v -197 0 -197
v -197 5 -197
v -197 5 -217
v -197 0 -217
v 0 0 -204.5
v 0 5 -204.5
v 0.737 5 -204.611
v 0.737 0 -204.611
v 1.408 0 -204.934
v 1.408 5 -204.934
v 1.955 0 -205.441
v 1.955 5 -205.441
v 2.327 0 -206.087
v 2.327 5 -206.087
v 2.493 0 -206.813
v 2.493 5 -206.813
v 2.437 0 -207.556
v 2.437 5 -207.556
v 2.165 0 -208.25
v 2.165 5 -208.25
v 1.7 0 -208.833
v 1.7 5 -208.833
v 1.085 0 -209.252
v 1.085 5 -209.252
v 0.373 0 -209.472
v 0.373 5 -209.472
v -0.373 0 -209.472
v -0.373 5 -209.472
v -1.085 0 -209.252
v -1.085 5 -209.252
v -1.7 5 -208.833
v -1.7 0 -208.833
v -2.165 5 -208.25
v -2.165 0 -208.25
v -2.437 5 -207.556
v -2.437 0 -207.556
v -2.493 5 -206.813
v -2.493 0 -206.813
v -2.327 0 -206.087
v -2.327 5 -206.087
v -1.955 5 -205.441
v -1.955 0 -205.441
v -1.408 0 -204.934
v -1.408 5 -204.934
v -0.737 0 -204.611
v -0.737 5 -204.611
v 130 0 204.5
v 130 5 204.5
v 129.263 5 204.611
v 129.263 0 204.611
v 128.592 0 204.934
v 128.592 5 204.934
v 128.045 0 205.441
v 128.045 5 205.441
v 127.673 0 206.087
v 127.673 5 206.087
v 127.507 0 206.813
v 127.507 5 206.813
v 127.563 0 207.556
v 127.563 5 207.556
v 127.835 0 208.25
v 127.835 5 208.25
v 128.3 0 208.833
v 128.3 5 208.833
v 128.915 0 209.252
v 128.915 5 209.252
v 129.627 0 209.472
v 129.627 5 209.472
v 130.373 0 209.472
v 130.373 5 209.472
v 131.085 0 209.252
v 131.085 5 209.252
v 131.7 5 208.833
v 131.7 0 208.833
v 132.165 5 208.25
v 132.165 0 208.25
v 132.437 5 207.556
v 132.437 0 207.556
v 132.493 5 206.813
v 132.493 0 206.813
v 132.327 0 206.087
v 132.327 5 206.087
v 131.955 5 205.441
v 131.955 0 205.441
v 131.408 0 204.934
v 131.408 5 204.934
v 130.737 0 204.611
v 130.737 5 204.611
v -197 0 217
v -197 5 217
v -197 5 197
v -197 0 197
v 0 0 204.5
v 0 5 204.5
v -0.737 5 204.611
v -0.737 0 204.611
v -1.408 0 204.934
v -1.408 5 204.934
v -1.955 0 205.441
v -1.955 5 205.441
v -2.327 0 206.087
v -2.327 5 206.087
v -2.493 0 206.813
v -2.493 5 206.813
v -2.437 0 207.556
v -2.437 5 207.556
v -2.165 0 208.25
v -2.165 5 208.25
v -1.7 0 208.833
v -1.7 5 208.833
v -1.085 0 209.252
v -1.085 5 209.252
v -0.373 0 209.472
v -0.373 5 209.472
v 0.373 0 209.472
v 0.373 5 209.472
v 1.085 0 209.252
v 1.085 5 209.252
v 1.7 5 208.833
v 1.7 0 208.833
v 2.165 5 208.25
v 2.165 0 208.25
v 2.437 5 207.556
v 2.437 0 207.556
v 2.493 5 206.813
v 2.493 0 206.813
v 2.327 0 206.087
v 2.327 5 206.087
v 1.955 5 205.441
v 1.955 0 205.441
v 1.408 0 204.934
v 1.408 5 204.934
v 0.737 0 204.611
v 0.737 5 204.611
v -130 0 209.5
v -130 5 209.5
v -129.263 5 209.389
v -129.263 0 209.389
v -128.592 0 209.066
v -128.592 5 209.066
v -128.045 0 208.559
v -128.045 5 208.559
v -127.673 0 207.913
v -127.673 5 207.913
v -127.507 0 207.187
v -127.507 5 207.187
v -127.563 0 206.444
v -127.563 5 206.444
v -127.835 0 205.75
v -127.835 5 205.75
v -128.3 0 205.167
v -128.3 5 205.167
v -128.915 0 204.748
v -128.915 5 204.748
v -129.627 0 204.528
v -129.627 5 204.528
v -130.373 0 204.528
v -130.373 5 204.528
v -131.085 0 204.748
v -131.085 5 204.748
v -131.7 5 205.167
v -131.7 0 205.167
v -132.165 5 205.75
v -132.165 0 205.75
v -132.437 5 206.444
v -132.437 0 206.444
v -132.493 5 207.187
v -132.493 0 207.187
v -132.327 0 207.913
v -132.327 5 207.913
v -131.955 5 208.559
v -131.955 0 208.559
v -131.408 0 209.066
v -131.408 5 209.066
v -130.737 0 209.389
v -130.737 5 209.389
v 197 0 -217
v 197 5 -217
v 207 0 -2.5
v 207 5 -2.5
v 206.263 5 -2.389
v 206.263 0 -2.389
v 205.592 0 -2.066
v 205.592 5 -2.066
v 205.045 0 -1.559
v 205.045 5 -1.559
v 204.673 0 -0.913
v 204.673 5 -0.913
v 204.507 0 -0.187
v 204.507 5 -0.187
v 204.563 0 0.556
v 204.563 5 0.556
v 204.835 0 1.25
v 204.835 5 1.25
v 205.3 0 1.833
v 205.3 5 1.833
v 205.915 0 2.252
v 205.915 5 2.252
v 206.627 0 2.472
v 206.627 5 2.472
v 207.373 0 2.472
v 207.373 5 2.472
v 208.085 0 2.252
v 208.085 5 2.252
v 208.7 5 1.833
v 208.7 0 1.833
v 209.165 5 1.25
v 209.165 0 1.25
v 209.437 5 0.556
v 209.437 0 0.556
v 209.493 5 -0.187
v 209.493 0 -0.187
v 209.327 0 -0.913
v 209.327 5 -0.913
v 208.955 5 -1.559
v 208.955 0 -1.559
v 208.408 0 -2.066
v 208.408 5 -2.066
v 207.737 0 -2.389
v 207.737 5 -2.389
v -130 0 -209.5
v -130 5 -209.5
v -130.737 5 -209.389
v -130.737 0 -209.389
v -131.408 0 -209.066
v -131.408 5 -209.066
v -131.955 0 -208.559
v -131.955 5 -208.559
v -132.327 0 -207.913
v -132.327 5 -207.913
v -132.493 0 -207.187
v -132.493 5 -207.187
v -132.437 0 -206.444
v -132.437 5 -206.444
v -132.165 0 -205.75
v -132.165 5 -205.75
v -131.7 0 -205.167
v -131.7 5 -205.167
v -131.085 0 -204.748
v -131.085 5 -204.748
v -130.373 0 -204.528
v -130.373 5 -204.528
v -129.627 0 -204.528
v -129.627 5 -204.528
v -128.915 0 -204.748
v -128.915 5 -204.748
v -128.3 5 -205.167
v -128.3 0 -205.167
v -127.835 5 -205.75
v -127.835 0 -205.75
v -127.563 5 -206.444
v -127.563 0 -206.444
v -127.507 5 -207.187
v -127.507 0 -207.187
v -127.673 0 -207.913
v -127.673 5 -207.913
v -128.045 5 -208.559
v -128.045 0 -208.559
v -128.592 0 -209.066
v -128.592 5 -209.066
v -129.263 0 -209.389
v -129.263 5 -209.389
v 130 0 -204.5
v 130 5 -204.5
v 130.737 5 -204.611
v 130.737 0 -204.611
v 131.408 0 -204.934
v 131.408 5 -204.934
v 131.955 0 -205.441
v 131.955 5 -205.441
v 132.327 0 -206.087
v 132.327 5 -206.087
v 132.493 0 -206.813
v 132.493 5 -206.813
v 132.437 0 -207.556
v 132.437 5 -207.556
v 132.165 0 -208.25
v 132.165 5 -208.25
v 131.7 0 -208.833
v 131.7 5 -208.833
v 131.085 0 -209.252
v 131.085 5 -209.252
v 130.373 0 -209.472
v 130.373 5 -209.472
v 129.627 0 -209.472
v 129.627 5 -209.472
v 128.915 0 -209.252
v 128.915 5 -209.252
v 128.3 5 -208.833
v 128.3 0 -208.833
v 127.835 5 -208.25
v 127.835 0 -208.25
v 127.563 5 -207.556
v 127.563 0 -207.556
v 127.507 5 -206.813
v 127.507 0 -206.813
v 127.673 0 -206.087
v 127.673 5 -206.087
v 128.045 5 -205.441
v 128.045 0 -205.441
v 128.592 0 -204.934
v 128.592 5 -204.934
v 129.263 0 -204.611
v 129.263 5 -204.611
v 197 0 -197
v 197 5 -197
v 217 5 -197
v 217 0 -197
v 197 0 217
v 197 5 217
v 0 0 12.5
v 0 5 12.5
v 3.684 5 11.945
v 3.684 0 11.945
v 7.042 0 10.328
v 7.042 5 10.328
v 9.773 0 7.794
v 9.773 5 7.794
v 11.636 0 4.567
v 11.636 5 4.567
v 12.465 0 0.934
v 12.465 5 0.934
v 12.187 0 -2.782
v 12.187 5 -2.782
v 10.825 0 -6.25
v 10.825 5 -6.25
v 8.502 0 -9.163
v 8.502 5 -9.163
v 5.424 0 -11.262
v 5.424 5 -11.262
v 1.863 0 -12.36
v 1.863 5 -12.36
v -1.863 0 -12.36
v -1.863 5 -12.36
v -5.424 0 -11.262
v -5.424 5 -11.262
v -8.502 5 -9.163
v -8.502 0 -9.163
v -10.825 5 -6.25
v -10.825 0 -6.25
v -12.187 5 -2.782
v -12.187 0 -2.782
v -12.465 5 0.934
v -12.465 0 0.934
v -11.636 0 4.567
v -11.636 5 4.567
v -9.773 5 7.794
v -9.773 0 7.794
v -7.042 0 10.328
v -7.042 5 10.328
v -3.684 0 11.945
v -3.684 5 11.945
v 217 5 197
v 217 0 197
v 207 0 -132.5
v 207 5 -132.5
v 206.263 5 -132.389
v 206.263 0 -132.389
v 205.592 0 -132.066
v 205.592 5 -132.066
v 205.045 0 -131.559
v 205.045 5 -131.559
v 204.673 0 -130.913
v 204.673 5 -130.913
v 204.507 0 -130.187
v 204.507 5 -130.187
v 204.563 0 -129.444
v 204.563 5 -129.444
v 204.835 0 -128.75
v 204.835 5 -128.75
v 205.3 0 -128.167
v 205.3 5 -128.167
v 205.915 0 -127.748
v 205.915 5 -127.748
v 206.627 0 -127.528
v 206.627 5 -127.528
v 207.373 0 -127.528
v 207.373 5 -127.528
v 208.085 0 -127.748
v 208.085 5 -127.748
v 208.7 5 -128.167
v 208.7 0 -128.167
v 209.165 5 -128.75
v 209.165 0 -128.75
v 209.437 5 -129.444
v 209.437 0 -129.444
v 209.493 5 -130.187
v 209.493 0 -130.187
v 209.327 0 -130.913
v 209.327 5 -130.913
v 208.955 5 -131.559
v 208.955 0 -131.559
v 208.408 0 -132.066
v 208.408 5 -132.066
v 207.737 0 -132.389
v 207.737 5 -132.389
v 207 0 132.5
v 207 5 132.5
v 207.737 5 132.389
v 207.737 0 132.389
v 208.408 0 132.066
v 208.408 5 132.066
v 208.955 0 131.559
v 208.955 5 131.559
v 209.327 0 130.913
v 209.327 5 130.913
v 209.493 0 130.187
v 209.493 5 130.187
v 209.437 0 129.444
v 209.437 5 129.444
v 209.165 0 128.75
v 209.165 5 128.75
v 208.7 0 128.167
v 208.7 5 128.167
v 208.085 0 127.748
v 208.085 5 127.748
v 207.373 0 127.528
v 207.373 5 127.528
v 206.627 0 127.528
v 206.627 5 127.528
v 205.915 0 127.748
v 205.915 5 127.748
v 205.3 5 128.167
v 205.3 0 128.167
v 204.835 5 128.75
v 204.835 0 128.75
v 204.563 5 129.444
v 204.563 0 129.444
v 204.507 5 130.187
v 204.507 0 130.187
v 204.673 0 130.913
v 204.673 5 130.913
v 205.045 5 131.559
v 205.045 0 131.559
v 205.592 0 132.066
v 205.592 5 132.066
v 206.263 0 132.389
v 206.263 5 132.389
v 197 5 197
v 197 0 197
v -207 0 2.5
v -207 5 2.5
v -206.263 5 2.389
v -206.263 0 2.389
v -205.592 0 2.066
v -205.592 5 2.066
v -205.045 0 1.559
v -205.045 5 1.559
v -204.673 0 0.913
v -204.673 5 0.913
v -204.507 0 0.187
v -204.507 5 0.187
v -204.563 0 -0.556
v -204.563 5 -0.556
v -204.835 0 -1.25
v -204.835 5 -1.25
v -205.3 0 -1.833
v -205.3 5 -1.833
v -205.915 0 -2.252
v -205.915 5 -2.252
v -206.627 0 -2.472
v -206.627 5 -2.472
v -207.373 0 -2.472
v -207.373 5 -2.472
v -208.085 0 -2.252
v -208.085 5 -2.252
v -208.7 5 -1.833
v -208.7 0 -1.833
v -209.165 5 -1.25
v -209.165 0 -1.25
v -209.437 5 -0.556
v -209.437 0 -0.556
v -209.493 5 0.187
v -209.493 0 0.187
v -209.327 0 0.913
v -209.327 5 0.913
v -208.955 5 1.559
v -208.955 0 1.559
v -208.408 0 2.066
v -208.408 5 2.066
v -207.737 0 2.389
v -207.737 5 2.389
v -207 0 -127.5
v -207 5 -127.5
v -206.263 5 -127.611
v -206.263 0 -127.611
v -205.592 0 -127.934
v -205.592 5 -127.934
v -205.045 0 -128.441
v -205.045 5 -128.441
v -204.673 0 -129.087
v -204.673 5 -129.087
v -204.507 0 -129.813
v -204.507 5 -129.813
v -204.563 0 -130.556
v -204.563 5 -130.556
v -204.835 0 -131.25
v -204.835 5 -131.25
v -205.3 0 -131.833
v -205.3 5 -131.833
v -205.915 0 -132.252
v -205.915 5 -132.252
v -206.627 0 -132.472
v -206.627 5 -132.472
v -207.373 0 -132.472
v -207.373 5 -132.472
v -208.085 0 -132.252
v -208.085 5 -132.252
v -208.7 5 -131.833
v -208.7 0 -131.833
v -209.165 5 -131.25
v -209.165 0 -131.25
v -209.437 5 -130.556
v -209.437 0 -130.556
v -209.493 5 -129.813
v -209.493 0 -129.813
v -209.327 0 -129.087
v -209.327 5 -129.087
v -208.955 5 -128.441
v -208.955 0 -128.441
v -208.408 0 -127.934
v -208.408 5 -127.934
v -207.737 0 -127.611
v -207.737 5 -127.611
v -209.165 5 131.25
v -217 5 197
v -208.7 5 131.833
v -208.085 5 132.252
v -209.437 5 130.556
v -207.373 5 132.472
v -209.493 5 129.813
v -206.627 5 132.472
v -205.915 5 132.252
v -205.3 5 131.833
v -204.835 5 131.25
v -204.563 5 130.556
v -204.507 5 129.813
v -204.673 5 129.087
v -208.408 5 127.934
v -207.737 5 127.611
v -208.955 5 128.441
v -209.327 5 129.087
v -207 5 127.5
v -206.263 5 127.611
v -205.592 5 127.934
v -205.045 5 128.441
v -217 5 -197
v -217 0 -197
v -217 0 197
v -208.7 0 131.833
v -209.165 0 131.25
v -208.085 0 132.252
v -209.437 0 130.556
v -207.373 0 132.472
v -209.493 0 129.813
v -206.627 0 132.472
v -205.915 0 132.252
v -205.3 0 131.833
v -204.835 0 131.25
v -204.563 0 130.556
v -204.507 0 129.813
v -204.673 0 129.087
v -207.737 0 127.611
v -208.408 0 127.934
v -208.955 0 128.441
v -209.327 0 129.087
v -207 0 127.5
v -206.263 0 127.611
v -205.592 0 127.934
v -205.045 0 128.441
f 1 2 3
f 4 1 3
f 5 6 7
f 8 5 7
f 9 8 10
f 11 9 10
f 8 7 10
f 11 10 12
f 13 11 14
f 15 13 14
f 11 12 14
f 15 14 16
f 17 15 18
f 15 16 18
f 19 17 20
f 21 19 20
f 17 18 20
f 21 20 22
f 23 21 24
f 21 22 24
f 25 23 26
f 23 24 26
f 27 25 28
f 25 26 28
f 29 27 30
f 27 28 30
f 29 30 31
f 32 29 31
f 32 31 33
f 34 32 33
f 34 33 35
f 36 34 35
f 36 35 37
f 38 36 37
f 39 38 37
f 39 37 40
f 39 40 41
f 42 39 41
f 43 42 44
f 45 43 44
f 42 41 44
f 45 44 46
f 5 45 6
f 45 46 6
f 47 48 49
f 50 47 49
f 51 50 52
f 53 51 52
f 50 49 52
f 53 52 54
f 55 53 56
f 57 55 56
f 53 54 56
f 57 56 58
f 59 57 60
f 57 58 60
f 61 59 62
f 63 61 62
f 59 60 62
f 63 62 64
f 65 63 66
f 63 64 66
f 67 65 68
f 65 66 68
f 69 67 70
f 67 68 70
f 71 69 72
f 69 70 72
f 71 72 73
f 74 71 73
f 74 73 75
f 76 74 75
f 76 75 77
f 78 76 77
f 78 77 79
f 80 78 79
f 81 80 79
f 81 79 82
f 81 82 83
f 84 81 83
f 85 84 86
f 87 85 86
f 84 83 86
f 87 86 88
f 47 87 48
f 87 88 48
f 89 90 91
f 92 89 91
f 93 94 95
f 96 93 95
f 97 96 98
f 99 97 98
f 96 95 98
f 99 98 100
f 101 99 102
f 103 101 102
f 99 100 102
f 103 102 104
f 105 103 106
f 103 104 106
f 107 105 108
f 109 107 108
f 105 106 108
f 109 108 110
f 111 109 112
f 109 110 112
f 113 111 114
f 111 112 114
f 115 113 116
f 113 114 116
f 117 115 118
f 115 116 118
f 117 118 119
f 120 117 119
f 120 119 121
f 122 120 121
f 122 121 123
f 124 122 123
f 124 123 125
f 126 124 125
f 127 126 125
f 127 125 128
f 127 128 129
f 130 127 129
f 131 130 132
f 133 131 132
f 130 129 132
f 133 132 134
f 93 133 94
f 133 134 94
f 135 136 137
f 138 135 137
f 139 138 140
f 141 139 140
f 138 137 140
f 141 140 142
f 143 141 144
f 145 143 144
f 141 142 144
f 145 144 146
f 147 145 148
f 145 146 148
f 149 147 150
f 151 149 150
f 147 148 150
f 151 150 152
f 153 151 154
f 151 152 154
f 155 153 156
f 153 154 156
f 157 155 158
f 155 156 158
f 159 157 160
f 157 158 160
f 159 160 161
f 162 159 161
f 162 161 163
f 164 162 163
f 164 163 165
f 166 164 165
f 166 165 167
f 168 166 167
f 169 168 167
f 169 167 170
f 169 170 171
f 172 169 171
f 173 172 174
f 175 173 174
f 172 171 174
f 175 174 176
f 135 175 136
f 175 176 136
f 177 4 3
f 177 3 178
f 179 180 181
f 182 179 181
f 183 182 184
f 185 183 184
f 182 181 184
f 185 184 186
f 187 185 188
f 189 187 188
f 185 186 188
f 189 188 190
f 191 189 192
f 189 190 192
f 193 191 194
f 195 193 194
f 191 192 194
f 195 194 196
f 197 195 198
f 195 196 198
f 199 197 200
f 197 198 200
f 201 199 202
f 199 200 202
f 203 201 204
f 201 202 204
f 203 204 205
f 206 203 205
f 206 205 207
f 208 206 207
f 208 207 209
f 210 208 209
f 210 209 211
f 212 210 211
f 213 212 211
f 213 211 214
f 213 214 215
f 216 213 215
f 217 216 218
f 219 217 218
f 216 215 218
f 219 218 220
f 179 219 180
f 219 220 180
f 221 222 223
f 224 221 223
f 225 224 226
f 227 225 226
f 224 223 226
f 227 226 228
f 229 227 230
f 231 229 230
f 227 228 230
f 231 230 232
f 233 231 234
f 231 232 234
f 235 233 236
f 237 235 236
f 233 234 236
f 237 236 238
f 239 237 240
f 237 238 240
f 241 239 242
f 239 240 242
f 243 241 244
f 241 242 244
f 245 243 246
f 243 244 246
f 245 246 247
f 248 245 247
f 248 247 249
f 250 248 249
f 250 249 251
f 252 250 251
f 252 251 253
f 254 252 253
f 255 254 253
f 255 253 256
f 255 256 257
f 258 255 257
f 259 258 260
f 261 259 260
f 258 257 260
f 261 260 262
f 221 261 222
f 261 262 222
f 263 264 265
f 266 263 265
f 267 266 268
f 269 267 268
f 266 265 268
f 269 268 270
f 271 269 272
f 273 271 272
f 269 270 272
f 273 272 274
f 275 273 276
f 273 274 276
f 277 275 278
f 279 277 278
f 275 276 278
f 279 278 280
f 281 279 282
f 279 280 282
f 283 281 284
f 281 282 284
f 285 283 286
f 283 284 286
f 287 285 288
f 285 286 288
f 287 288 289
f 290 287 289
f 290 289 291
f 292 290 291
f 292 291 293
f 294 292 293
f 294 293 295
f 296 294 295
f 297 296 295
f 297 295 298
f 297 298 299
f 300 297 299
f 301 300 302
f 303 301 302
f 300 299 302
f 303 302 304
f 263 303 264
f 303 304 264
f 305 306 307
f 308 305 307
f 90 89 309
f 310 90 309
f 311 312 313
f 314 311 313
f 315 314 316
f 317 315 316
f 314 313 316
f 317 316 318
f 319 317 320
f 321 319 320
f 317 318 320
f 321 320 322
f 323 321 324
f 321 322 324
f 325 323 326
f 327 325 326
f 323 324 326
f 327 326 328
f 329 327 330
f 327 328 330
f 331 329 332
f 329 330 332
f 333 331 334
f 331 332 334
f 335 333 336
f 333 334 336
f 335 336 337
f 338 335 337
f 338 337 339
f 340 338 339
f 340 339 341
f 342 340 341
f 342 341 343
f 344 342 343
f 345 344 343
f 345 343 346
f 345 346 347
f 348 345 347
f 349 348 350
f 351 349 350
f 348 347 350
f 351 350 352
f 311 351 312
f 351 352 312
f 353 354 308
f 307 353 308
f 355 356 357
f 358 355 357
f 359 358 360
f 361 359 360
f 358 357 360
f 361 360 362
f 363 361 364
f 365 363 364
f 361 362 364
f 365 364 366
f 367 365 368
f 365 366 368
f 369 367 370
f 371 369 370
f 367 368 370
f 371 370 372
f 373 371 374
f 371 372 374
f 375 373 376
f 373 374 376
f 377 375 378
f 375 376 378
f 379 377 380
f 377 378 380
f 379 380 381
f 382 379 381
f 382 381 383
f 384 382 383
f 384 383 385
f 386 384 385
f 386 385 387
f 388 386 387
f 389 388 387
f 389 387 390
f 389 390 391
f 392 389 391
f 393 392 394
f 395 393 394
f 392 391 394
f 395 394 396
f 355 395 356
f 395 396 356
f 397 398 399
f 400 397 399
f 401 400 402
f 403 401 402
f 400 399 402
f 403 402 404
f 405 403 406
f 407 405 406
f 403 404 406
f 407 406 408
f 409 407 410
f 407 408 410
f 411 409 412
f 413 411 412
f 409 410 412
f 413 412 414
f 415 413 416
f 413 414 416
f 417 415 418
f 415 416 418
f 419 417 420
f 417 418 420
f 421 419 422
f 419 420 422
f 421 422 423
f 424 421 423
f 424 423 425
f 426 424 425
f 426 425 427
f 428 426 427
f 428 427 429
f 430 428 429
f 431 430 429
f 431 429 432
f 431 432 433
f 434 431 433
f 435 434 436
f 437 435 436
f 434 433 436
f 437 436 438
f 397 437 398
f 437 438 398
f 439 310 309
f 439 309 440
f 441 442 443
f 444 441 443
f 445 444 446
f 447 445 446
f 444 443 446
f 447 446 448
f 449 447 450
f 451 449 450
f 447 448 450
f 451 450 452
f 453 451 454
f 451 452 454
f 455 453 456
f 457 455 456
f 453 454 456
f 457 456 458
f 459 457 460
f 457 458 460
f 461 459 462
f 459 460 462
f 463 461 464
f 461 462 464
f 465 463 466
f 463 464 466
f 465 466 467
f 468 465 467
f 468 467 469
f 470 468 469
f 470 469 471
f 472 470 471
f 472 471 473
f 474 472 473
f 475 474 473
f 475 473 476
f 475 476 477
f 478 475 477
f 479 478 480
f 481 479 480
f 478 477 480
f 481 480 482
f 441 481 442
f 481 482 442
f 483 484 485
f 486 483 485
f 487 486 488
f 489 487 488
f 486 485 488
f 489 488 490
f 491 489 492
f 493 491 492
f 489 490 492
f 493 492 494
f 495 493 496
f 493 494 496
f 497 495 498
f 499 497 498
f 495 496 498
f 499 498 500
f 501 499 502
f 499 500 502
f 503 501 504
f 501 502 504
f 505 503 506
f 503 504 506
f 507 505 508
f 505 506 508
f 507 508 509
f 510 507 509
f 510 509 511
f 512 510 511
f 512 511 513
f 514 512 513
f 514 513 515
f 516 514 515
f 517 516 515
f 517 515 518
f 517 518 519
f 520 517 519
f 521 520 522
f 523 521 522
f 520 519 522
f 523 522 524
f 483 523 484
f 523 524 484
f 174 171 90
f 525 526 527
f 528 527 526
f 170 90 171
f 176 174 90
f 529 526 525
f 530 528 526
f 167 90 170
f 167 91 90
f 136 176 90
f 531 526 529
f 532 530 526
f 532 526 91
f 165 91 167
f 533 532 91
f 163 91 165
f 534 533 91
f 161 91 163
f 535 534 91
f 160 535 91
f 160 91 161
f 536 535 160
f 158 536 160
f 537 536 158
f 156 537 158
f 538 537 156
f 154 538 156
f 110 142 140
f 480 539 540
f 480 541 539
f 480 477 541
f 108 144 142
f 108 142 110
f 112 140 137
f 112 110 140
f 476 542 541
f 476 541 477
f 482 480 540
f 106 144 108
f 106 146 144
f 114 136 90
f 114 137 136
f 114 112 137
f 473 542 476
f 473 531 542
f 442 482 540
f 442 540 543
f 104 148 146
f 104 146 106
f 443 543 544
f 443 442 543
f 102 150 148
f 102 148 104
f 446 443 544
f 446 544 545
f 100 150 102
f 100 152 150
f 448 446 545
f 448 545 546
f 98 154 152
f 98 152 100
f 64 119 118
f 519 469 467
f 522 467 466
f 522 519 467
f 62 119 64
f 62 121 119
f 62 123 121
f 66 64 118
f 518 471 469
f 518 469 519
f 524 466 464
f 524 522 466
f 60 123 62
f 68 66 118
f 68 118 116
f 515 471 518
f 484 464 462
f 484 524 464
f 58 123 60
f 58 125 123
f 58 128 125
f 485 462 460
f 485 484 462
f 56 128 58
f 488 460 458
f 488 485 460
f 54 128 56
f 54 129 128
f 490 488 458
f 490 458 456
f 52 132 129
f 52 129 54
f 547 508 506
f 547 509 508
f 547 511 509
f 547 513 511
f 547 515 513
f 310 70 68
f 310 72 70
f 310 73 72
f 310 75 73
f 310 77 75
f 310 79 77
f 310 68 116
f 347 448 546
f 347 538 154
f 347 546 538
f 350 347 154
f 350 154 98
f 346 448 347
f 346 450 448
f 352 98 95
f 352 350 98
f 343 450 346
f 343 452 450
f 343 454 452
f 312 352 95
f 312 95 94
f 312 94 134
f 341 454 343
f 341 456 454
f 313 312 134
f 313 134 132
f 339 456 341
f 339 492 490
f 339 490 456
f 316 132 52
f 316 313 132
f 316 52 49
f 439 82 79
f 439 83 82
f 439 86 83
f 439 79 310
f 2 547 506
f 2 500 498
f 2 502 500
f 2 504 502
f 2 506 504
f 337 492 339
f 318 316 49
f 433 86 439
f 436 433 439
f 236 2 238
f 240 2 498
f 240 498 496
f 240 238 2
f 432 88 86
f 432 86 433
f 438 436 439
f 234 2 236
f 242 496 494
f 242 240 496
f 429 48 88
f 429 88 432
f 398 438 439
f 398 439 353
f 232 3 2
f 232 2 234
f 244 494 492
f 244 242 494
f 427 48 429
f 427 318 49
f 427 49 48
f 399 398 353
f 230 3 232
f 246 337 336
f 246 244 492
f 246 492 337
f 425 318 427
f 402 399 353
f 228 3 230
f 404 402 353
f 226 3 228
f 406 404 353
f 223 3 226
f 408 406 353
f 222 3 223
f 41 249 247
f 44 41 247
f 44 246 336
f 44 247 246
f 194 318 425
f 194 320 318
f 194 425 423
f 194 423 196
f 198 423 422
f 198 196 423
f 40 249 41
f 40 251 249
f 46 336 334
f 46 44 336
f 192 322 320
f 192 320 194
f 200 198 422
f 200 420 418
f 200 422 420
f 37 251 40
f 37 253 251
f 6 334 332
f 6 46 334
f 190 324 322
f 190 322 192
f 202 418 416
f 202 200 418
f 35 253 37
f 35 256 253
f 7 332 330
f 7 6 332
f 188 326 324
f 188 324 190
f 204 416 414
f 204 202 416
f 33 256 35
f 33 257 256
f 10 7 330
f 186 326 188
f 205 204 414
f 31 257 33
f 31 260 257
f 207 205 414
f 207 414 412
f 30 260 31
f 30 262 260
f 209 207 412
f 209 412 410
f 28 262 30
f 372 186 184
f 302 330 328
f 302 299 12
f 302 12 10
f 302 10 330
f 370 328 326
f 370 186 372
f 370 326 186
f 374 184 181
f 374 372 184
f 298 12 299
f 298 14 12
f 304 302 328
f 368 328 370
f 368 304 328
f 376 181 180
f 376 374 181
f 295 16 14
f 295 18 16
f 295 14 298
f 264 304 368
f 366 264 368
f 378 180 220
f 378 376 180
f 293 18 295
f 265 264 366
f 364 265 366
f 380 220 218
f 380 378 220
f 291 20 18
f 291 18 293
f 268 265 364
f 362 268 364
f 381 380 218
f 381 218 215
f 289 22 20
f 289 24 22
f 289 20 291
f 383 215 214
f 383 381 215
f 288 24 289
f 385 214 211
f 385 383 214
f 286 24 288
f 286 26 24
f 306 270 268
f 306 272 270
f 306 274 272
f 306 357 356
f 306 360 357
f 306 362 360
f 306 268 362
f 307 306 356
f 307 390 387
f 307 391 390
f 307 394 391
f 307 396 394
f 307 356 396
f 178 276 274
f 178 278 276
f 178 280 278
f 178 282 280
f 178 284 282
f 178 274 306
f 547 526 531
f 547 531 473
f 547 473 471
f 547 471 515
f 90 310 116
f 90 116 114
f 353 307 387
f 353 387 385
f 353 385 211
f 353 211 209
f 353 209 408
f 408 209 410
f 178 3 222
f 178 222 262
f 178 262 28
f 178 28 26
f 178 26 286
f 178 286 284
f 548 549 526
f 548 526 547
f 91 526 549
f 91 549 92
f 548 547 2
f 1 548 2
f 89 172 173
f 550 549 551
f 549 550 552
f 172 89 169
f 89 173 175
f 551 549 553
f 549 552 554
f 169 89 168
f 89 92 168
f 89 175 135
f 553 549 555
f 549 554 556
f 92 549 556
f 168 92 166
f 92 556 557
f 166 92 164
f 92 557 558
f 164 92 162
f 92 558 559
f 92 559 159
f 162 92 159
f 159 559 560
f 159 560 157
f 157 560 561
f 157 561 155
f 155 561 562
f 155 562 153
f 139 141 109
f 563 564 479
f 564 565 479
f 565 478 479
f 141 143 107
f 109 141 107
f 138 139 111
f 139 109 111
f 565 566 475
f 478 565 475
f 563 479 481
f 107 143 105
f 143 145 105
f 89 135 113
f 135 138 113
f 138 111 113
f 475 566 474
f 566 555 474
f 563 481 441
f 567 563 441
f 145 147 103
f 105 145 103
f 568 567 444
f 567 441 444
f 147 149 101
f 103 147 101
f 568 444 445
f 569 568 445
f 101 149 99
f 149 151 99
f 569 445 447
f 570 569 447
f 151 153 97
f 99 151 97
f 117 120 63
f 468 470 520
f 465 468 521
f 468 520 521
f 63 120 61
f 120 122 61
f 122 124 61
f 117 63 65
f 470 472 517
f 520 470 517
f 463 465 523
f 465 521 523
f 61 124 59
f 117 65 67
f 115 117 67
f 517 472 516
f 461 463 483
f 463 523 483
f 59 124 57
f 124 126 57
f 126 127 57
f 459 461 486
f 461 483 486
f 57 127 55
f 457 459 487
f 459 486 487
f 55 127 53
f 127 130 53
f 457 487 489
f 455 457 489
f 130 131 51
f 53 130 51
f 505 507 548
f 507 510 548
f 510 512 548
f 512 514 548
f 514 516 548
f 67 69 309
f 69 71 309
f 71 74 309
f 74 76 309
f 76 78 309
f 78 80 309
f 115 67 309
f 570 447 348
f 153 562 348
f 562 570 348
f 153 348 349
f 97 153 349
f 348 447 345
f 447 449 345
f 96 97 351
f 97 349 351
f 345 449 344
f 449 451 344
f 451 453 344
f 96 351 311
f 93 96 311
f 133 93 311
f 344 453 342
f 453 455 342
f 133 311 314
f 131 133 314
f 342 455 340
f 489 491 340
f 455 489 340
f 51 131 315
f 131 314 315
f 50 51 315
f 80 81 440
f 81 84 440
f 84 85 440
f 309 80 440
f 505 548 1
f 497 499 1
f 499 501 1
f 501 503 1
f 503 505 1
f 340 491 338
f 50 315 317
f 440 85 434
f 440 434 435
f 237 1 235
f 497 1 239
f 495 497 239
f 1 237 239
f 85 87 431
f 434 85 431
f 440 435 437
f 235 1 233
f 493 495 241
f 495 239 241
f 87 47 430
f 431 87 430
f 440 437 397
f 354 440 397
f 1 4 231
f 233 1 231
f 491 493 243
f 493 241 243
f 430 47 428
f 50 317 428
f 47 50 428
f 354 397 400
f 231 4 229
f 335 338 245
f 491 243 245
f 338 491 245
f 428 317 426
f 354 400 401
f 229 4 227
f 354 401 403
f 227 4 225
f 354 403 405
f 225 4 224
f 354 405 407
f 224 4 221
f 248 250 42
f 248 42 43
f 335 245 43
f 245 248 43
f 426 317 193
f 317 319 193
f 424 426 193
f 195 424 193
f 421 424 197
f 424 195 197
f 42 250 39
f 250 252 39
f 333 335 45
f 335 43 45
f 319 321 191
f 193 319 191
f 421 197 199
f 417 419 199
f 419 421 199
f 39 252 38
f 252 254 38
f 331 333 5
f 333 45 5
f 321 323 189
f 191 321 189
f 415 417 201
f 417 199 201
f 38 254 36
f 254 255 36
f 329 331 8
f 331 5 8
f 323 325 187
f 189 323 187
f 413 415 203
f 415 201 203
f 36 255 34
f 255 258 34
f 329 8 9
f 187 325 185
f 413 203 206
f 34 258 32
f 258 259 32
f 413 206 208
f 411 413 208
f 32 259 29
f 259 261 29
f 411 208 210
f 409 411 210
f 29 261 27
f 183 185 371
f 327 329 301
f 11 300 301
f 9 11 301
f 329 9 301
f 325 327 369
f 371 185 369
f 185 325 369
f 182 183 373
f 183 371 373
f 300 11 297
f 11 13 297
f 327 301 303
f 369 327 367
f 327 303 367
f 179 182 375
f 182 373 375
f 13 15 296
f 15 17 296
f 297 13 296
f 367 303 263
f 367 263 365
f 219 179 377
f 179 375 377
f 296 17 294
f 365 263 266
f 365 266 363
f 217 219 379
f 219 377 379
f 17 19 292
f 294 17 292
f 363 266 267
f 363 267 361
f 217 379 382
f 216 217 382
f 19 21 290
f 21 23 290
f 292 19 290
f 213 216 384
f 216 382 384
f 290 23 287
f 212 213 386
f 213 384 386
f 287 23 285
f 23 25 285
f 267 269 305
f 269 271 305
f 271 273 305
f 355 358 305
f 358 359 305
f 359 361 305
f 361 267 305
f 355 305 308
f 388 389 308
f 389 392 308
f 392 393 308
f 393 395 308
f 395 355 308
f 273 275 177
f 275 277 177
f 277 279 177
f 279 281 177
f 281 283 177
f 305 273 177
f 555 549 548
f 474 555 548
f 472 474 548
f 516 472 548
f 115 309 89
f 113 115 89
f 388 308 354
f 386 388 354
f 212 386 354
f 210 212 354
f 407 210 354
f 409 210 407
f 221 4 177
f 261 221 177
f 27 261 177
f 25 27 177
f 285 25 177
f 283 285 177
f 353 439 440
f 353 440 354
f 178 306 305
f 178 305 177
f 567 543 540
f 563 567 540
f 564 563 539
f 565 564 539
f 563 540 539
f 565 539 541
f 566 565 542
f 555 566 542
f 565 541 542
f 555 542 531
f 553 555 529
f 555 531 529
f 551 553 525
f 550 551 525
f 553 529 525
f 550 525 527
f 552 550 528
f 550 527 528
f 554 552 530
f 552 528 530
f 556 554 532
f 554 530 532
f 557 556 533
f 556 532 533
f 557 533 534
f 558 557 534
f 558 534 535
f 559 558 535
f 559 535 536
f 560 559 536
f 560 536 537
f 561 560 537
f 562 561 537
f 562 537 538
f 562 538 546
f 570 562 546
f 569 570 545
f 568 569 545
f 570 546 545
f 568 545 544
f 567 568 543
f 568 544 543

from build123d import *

# Parameters (mm, degrees)
SKETCH1_W           = 434
SKETCH1_H           = 434
BOSS_EXTRUDE1_DEPTH = 5
SKETCH2_R           = 2.5
CUT_EXTRUDE1_DEPTH  = 5
SKETCH3_R           = 12.5
CUT_EXTRUDE2_DEPTH  = 5
SKETCH4_W           = 20
SKETCH4_H           = 20
CUT_EXTRUDE3_DEPTH  = 10


with BuildPart() as part:
    # Sketch1 → Boss-Extrude1 (new body)
    with BuildSketch(Plane(origin=(0, 0, 0), x_dir=(1, 0, 0), z_dir=(0, 1, 0))):
        Rectangle(SKETCH1_W, SKETCH1_H)
    extrude(amount=BOSS_EXTRUDE1_DEPTH)

    # Sketch2 → Cut-Extrude1 (cut)
    with BuildSketch(Plane(origin=(0, 5, 0), x_dir=(1, 0, 0), z_dir=(0, 1, 0))):
        with Locations(Location((-207, 130, 0), (0, 0, 270))):
            Circle(SKETCH2_R)
        with Locations(Location((-207, 0, 0), (0, 0, 270))):
            Circle(SKETCH2_R)
        with Locations(Location((-207, -130, 0), (0, 0, 90))):
            Circle(SKETCH2_R)
        with Locations(Location((207, -130, 0), (0, 0, 270))):
            Circle(SKETCH2_R)
        with Locations(Location((207, 0, 0), (0, 0, 90))):
            Circle(SKETCH2_R)
        with Locations(Location((207, 130, 0), (0, 0, 90))):
            Circle(SKETCH2_R)
        with Locations(Location((130, 207, 0), (0, 0, 270))):
            Circle(SKETCH2_R)
        with Locations(Location((0, 207, 0), (0, 0, 270))):
            Circle(SKETCH2_R)
        with Locations(Location((-130, 207, 0), (0, 0, 90))):
            Circle(SKETCH2_R)
        with Locations(Location((-130, -207, 0), (0, 0, 270))):
            Circle(SKETCH2_R)
        with Locations(Location((0, -207, 0), (0, 0, 90))):
            Circle(SKETCH2_R)
        with Locations(Location((130, -207, 0), (0, 0, 90))):
            Circle(SKETCH2_R)
    extrude(amount=-CUT_EXTRUDE1_DEPTH, mode=Mode.SUBTRACT)

    # Sketch3 → Cut-Extrude2 (cut)
    with BuildSketch(Plane(origin=(0, 5, 0), x_dir=(1, 0, 0), z_dir=(0, 1, 0))):
        with Locations(Location((0, 0, 0), (0, 0, 270))):
            Circle(SKETCH3_R)
    extrude(amount=-CUT_EXTRUDE2_DEPTH, mode=Mode.SUBTRACT)

    # Sketch4 → Cut-Extrude3 (cut)
    with BuildSketch(Plane(origin=(0, 5, 0), x_dir=(1, 0, 0), z_dir=(0, 1, 0))):
        with Locations((-207, 207)):
            Rectangle(SKETCH4_W, SKETCH4_H)
        with Locations((207, 207)):
            Rectangle(SKETCH4_W, SKETCH4_H)
        with Locations((207, -207)):
            Rectangle(SKETCH4_W, SKETCH4_H)
        with Locations((-207, -207)):
            Rectangle(SKETCH4_W, SKETCH4_H)
    extrude(amount=-CUT_EXTRUDE3_DEPTH, mode=Mode.SUBTRACT)


solid = part.part
